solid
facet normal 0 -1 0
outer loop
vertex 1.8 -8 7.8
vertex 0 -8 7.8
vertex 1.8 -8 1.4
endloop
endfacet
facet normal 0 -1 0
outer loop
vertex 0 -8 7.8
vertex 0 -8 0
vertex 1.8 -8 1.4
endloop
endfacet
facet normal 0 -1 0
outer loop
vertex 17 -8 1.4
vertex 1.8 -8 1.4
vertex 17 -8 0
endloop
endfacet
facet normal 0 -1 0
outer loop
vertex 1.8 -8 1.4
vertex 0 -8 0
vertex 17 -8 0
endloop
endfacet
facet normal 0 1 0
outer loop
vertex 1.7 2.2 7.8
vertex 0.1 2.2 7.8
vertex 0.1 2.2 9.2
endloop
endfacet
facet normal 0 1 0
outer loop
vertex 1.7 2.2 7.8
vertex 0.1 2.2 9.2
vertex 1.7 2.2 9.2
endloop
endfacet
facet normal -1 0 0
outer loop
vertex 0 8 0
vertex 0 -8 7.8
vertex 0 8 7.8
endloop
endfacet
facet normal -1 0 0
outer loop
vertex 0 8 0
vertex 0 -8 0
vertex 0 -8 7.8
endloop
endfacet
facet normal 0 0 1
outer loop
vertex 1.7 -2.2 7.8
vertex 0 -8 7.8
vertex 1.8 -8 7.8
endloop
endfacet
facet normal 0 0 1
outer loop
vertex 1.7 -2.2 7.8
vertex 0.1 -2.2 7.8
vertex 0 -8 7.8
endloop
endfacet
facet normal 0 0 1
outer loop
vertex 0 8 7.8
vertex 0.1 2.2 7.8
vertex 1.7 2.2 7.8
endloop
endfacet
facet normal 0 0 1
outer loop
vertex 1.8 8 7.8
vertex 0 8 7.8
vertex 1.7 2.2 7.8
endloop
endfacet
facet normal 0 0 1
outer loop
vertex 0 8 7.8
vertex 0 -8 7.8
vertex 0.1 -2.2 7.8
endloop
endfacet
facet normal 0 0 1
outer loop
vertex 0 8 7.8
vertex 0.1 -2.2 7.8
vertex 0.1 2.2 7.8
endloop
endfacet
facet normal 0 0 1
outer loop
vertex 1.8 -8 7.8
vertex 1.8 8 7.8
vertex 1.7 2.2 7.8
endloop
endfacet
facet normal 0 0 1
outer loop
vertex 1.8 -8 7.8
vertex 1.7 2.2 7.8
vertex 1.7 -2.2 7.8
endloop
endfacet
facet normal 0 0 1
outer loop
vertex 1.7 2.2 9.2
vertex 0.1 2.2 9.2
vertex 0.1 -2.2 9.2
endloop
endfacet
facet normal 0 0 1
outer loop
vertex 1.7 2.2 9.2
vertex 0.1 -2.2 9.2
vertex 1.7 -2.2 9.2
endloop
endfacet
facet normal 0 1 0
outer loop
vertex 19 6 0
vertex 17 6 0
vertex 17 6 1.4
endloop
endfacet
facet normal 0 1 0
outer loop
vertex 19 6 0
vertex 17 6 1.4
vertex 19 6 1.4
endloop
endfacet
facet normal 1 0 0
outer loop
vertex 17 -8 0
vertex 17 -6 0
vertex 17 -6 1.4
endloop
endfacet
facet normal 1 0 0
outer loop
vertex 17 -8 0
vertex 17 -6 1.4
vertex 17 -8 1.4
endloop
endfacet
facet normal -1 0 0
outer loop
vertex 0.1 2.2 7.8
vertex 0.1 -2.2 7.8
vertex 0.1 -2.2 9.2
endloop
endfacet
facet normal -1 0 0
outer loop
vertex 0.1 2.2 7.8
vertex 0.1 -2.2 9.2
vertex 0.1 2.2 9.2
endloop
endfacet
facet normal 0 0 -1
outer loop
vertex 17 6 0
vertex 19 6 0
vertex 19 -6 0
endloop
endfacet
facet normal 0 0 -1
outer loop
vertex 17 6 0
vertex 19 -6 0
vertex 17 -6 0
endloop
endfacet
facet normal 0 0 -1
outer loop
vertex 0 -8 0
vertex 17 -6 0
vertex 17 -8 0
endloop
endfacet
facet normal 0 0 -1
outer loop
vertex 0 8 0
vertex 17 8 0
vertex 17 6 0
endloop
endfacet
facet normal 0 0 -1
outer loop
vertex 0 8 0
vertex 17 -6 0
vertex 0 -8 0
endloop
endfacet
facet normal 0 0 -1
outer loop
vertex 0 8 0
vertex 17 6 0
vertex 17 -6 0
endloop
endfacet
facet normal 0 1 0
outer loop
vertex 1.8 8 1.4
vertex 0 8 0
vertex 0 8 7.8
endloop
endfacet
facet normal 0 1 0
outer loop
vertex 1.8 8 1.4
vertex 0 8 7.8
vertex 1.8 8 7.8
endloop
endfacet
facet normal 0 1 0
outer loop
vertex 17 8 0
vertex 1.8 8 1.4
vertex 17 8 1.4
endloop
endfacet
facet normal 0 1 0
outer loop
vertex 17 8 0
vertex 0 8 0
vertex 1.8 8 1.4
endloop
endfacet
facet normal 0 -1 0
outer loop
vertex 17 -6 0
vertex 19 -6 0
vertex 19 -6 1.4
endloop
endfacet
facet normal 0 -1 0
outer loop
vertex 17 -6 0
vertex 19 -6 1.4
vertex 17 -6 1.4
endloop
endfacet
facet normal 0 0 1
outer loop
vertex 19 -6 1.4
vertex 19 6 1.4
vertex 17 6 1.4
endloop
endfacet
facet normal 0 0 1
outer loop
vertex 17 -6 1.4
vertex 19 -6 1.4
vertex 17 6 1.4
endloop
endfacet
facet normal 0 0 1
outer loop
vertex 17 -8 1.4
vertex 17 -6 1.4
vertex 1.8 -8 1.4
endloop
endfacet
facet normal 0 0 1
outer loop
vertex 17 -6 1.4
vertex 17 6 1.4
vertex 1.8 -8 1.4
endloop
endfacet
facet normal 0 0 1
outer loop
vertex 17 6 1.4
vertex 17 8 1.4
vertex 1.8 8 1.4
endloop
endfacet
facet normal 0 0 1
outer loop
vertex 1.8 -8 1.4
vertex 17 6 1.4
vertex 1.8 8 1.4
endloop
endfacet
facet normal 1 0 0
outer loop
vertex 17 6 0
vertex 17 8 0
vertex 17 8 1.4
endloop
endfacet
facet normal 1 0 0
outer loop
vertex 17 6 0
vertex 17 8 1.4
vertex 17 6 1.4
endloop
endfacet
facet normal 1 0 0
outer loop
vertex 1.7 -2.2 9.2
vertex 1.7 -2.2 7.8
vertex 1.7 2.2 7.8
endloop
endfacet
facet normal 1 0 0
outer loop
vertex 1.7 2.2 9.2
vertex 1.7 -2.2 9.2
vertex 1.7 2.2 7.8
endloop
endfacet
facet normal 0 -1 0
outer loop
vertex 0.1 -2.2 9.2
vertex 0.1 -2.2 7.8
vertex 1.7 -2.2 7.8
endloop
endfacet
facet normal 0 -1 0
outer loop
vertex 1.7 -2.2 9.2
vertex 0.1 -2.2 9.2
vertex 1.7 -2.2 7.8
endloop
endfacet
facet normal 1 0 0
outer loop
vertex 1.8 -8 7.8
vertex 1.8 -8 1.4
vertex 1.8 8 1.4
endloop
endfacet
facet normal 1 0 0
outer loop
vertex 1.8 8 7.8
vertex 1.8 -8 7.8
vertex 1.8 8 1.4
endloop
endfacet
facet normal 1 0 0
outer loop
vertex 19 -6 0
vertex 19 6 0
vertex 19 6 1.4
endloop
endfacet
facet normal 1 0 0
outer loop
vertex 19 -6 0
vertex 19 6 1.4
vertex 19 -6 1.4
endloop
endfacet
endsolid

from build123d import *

# Parameters (mm, degrees)
PAD031_DEPTH = 1.4
SKETCH158_W  = 1.8
SKETCH158_H  = 16
PAD032_DEPTH = 6.4
SKETCH159_W  = 1.6
SKETCH159_H  = 4.4
PAD033_DEPTH = 1.4


with BuildPart() as part:
    # Sketch157 → Pad031 (new body)
    with BuildSketch(Plane.XY):
        Polygon((1.8, 8), (17, 8), (17, 6), (19, 6), (19, -6), (17, -6), (17, -8), (1.8, -8), (0, -8), (0, 8), align=None)
    extrude(amount=PAD031_DEPTH)

    # Sketch158 (on Face8 of Pad031) → Pad032 (join)
    with BuildSketch(Plane.XY.offset(1.4)):
        with Locations((0.9, 0)):
            Rectangle(SKETCH158_W, SKETCH158_H)
    extrude(amount=PAD032_DEPTH)

    # Sketch159 (on Face9 of Pad032) → Pad033 (join)
    with BuildSketch(Plane.XY.offset(7.8)):
        with Locations((0.9, 0)):
            Rectangle(SKETCH159_W, SKETCH159_H)
    extrude(amount=PAD033_DEPTH)


solid = part.part
